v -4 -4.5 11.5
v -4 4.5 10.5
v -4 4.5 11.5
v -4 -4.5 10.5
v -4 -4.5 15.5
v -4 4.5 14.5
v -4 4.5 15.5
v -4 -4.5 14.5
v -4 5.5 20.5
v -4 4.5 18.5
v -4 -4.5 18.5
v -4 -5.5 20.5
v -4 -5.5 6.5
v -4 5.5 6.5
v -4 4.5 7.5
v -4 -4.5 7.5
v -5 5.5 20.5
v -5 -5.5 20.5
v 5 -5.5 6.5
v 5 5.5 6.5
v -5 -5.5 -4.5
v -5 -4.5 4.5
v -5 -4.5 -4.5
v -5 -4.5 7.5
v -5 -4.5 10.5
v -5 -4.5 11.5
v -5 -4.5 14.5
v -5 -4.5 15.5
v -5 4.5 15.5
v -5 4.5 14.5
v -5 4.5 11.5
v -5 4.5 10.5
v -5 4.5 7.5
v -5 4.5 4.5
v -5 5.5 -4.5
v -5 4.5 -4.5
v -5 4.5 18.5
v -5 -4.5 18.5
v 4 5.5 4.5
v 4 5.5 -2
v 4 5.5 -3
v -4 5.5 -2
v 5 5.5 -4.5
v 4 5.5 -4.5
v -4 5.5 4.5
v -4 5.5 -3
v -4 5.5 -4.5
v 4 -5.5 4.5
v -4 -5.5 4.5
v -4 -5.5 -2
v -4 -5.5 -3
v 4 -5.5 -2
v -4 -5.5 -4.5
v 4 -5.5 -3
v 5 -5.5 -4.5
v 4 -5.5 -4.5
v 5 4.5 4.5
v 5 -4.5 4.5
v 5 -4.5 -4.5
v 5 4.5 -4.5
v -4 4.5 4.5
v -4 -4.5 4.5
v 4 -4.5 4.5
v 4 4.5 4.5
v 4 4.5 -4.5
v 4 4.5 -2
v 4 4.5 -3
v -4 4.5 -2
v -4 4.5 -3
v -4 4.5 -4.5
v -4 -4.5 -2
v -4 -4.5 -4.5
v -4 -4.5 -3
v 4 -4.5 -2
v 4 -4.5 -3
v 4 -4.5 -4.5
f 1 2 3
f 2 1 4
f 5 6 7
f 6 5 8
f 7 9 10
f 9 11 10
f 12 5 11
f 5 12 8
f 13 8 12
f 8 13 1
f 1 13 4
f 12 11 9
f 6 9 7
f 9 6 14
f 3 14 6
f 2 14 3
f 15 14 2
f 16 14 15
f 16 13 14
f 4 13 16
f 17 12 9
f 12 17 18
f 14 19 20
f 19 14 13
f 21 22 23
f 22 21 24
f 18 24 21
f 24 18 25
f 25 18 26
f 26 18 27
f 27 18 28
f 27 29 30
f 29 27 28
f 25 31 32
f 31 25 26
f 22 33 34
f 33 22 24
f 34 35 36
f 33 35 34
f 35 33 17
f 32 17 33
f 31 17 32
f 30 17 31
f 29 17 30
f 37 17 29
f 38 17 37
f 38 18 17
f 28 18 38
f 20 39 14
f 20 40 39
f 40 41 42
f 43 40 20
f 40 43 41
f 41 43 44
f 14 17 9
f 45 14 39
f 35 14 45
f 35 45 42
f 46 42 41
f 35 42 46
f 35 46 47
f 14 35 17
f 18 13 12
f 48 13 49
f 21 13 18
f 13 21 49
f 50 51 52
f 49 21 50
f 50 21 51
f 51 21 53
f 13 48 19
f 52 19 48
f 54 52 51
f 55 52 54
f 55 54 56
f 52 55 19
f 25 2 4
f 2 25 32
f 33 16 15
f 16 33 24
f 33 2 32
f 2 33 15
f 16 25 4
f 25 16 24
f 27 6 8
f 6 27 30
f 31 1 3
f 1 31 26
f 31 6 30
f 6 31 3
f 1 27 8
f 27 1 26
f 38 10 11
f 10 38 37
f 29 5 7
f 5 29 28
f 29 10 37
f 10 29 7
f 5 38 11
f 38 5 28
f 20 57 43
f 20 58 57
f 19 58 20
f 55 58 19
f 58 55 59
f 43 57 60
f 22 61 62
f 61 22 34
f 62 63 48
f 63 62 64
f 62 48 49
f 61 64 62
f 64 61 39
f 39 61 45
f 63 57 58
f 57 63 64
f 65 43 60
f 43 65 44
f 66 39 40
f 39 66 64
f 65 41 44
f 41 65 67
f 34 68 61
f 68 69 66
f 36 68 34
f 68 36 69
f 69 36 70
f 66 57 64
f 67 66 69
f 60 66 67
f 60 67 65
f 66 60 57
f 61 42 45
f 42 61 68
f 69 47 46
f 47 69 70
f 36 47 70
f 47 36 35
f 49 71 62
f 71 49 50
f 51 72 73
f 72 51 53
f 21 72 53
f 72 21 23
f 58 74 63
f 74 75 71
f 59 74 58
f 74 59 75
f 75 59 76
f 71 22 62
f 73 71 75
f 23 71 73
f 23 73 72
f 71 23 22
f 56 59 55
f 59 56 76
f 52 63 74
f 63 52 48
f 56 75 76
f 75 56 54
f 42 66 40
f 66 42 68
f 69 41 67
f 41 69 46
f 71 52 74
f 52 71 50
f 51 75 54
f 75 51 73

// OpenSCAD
// Angelo Nicolì 2023 - Licensed GPL-2.0

// Modify Input DATA to change the shape of the chair




module Chair_01(){
    // INPUT DATA

    Table_Leg = [1,1,9];      // lenght, width and height of legs
    Table_Top_Height = 2;     //  Height of theSeat

    Leg_Distance_x = 9;        
    Leg_Distance_y = 10;     

    seat_height = 14;         // Backpost size 
    seat_width = 1;           // Backpost width (x axis)


    // OUTPUT DATA

    translate([Leg_Distance_x*0.5,Leg_Distance_y*0.5,0])
    color("PowderBlue")
    cube([Table_Leg[0],Table_Leg[1],Table_Leg[2]],center=true);

    translate([-Leg_Distance_x*0.5,Leg_Distance_y*0.5,0])
    color("PowderBlue")
    cube([Table_Leg[0],Table_Leg[1],Table_Leg[2]],center=true);

    translate([-Leg_Distance_x*0.5,-Leg_Distance_y*0.5,0])
    color("PowderBlue")
    cube([Table_Leg[0],Table_Leg[1],Table_Leg[2]],center=true);

    translate([Leg_Distance_x*0.5,-Leg_Distance_y*0.5,0])
    color("PowderBlue")
    cube([Table_Leg[0],Table_Leg[1],Table_Leg[2]],center=true);

    Table_Upper = [Leg_Distance_x + Table_Leg[0],Leg_Distance_y +Table_Leg[1],Table_Top_Height];

    seat = [seat_width,Leg_Distance_y+Table_Leg[1],seat_height];

    translate([0,0,Table_Leg[2]*0.5+Table_Top_Height*0.5])
    color("PowderBlue")
    cube([Table_Upper[0],Table_Upper[1],Table_Upper[2]],center=true);

    
    difference(){
    translate([-Table_Upper[0]*0.5+seat[0]*0.5,0,Table_Leg[2]*0.5+Table_Top_Height+seat_height*0.5])
    color("YellowGreen")
    cube([seat[0],seat[1],seat[2]],center=true);
    
    translate([0,0,9]){
    color("YellowGreen")
    cube([15,9,3],center=true);
    }
    
    translate([0,0,13]){
    color("YellowGreen")
    cube([15,9,3],center=true);
    }
    
    translate([0,0,17]){
    color("YellowGreen")
    cube([15,9,3],center=true);
    }
    }
    
    
    translate([0,5,-2.5])
    color("YellowGreen")
    cube([8,1,1],center=true);
    
    translate([0,-5,-2.5])
    color("YellowGreen")
    cube([8,1,1],center=true);
}


Chair_01();
